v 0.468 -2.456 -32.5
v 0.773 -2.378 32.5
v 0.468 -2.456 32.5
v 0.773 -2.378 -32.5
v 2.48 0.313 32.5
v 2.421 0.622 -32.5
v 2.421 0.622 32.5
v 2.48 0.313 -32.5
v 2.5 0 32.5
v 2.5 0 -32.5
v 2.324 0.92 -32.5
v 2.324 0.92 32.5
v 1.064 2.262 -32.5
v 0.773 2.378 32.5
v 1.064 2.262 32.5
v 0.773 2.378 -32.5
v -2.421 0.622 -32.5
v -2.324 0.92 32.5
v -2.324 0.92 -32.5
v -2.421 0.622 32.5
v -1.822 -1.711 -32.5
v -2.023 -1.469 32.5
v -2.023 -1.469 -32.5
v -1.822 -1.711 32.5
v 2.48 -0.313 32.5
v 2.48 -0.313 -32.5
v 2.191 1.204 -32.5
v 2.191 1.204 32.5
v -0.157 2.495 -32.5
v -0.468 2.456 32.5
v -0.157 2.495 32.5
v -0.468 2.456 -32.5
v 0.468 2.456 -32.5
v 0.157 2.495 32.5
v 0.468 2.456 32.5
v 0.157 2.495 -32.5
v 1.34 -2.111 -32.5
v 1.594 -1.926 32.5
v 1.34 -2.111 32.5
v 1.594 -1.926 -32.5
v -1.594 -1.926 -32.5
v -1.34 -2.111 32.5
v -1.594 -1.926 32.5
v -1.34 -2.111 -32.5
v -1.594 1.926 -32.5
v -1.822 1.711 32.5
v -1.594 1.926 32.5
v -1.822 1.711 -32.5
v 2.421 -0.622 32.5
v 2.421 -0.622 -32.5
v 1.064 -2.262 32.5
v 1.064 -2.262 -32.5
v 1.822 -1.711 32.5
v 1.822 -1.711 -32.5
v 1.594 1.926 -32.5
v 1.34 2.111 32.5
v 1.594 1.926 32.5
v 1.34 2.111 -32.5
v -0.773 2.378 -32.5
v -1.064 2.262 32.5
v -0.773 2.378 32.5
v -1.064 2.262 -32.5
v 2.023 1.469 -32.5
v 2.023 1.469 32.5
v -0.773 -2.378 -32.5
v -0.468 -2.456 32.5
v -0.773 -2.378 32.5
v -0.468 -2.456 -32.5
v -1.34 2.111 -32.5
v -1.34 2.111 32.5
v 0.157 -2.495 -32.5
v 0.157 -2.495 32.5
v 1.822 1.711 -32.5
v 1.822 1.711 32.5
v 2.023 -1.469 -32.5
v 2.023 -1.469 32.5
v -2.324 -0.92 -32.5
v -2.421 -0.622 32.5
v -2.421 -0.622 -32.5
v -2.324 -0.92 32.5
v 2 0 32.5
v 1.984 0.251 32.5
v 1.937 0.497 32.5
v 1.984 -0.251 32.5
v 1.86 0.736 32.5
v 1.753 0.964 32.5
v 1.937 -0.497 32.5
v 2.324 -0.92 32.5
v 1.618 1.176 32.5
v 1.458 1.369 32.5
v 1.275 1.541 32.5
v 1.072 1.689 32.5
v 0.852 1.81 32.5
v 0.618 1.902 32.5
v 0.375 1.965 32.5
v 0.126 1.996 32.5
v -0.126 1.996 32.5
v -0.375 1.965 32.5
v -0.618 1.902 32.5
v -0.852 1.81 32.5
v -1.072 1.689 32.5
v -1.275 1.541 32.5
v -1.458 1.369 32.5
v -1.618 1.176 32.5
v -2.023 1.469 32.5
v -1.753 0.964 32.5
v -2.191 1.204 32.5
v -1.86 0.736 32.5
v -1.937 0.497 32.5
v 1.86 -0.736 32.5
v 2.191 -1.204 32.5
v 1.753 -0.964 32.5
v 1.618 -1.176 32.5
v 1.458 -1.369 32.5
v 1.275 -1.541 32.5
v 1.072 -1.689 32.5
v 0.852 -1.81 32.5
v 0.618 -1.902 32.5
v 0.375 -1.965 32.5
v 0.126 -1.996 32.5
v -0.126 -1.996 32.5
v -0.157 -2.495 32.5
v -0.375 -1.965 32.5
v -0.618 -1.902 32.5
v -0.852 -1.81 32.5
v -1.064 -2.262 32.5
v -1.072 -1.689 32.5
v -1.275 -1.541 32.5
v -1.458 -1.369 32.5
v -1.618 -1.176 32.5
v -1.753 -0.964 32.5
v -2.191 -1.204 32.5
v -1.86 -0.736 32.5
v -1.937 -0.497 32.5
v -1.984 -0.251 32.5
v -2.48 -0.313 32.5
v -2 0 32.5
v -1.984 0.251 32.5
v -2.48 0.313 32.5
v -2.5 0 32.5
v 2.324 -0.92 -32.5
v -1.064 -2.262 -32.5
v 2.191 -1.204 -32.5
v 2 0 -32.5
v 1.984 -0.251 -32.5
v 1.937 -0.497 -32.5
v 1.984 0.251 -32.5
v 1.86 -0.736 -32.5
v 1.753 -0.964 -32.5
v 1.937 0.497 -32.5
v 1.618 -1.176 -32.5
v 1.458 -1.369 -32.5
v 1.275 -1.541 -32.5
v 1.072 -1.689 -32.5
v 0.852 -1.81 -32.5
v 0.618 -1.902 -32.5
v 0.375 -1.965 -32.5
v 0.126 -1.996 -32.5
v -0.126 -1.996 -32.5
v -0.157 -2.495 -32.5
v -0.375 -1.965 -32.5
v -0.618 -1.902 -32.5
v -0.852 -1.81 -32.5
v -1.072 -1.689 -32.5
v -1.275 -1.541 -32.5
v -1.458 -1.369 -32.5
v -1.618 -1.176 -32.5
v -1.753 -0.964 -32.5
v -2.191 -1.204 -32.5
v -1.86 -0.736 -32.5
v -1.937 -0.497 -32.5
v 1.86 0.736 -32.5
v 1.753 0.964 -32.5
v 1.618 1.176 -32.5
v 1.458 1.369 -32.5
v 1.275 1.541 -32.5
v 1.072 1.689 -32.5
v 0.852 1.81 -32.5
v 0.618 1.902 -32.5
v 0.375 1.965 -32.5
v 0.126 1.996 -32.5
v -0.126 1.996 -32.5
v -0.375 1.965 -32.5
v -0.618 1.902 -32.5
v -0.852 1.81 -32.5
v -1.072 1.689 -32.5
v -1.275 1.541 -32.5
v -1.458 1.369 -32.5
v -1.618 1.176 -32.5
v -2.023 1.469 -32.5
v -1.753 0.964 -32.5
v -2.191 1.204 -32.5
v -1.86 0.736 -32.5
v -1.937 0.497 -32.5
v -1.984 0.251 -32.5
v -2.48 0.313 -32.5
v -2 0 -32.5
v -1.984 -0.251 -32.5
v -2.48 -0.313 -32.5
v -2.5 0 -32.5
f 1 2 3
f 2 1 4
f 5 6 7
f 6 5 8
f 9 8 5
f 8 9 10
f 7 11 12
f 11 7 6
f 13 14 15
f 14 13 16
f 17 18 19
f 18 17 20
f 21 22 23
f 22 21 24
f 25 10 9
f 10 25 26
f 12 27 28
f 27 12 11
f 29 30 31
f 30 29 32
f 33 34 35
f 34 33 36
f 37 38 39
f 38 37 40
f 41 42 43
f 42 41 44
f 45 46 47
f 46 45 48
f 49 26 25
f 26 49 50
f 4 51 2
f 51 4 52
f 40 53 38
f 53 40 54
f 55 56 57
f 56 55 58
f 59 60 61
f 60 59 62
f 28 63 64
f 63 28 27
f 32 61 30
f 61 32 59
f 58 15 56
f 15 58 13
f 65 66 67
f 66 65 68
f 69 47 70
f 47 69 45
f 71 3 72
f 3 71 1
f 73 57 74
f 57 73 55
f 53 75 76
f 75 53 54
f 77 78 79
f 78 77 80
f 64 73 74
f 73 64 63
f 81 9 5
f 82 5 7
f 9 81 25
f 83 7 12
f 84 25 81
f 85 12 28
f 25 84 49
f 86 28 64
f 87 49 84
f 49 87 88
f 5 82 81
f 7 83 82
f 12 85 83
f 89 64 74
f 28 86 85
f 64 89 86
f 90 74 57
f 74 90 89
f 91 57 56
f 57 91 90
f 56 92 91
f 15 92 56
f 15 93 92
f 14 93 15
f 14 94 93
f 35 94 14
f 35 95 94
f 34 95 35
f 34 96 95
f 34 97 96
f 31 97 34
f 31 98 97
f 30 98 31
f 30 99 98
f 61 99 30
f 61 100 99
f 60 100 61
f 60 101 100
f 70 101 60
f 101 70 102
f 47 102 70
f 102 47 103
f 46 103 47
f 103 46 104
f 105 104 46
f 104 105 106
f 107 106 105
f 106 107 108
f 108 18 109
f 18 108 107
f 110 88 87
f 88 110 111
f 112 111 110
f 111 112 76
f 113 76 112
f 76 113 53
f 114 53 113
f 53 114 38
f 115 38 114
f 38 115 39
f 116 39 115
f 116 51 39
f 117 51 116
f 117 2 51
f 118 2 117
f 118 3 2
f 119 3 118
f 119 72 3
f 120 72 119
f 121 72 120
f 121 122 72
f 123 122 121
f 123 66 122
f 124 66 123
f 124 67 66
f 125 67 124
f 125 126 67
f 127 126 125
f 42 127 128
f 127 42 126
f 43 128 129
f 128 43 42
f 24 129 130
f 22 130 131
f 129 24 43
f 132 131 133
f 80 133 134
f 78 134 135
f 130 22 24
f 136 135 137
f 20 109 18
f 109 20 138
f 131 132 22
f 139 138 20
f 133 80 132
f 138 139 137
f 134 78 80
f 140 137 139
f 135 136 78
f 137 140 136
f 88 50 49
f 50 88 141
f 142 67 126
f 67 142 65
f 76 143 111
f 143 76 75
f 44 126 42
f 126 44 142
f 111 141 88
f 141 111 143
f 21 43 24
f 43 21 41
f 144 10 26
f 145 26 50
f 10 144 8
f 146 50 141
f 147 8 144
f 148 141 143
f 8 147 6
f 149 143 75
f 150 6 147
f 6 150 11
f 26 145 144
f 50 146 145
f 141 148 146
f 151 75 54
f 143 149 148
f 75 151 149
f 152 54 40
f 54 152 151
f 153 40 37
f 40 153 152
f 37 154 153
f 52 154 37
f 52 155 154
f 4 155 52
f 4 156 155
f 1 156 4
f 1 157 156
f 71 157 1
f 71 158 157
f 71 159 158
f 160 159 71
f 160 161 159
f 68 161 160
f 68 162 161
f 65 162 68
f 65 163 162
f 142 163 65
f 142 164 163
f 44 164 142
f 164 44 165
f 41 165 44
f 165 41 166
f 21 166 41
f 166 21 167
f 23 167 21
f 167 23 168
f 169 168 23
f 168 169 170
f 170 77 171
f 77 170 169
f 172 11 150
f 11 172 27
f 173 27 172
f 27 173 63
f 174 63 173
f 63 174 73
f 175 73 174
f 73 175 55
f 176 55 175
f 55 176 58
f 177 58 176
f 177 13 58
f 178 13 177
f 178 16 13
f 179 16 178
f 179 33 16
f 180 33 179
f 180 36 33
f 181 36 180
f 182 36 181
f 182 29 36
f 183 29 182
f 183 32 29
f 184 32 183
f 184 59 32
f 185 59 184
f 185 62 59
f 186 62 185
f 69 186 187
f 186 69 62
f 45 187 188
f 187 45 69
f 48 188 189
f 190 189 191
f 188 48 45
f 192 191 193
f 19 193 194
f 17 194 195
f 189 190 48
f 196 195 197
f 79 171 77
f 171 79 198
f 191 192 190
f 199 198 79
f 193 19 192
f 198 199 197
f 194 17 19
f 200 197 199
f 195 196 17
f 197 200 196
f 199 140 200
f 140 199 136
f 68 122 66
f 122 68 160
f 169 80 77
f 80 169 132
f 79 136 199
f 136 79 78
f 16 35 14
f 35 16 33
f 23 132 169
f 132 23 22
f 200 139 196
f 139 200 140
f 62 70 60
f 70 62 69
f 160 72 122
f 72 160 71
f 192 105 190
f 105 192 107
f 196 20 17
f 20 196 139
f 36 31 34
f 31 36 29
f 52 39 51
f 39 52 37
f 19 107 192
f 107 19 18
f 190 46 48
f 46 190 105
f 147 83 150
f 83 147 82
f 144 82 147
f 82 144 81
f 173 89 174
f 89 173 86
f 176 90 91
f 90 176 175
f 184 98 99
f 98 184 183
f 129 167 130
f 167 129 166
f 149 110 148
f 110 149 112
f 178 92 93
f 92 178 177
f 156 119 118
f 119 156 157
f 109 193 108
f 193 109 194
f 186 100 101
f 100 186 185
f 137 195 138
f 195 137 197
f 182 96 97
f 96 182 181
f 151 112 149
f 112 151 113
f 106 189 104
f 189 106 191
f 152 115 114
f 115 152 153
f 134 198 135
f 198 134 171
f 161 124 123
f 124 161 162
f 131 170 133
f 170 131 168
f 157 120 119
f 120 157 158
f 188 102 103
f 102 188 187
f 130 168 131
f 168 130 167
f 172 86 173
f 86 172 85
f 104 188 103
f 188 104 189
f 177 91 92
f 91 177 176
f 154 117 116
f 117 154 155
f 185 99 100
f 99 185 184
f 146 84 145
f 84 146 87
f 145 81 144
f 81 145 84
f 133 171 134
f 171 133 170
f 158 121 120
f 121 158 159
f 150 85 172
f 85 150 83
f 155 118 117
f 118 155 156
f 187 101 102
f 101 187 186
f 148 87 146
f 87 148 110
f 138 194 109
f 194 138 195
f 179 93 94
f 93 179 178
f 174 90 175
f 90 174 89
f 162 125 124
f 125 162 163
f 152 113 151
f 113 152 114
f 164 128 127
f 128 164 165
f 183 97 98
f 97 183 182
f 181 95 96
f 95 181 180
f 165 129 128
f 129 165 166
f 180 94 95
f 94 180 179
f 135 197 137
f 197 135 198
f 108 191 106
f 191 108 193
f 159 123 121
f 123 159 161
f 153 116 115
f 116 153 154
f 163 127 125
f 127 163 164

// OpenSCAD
$fn = 50;


difference() {
	union() {
		translate(v = [0, 0, -32.5000000000]) {
			cylinder(h = 65, r = 2.5000000000);
		}
	}
	union() {
		translate(v = [0, 0, -100.0000000000]) {
			cylinder(h = 200, r = 2.0000000000);
		}
	}
}
